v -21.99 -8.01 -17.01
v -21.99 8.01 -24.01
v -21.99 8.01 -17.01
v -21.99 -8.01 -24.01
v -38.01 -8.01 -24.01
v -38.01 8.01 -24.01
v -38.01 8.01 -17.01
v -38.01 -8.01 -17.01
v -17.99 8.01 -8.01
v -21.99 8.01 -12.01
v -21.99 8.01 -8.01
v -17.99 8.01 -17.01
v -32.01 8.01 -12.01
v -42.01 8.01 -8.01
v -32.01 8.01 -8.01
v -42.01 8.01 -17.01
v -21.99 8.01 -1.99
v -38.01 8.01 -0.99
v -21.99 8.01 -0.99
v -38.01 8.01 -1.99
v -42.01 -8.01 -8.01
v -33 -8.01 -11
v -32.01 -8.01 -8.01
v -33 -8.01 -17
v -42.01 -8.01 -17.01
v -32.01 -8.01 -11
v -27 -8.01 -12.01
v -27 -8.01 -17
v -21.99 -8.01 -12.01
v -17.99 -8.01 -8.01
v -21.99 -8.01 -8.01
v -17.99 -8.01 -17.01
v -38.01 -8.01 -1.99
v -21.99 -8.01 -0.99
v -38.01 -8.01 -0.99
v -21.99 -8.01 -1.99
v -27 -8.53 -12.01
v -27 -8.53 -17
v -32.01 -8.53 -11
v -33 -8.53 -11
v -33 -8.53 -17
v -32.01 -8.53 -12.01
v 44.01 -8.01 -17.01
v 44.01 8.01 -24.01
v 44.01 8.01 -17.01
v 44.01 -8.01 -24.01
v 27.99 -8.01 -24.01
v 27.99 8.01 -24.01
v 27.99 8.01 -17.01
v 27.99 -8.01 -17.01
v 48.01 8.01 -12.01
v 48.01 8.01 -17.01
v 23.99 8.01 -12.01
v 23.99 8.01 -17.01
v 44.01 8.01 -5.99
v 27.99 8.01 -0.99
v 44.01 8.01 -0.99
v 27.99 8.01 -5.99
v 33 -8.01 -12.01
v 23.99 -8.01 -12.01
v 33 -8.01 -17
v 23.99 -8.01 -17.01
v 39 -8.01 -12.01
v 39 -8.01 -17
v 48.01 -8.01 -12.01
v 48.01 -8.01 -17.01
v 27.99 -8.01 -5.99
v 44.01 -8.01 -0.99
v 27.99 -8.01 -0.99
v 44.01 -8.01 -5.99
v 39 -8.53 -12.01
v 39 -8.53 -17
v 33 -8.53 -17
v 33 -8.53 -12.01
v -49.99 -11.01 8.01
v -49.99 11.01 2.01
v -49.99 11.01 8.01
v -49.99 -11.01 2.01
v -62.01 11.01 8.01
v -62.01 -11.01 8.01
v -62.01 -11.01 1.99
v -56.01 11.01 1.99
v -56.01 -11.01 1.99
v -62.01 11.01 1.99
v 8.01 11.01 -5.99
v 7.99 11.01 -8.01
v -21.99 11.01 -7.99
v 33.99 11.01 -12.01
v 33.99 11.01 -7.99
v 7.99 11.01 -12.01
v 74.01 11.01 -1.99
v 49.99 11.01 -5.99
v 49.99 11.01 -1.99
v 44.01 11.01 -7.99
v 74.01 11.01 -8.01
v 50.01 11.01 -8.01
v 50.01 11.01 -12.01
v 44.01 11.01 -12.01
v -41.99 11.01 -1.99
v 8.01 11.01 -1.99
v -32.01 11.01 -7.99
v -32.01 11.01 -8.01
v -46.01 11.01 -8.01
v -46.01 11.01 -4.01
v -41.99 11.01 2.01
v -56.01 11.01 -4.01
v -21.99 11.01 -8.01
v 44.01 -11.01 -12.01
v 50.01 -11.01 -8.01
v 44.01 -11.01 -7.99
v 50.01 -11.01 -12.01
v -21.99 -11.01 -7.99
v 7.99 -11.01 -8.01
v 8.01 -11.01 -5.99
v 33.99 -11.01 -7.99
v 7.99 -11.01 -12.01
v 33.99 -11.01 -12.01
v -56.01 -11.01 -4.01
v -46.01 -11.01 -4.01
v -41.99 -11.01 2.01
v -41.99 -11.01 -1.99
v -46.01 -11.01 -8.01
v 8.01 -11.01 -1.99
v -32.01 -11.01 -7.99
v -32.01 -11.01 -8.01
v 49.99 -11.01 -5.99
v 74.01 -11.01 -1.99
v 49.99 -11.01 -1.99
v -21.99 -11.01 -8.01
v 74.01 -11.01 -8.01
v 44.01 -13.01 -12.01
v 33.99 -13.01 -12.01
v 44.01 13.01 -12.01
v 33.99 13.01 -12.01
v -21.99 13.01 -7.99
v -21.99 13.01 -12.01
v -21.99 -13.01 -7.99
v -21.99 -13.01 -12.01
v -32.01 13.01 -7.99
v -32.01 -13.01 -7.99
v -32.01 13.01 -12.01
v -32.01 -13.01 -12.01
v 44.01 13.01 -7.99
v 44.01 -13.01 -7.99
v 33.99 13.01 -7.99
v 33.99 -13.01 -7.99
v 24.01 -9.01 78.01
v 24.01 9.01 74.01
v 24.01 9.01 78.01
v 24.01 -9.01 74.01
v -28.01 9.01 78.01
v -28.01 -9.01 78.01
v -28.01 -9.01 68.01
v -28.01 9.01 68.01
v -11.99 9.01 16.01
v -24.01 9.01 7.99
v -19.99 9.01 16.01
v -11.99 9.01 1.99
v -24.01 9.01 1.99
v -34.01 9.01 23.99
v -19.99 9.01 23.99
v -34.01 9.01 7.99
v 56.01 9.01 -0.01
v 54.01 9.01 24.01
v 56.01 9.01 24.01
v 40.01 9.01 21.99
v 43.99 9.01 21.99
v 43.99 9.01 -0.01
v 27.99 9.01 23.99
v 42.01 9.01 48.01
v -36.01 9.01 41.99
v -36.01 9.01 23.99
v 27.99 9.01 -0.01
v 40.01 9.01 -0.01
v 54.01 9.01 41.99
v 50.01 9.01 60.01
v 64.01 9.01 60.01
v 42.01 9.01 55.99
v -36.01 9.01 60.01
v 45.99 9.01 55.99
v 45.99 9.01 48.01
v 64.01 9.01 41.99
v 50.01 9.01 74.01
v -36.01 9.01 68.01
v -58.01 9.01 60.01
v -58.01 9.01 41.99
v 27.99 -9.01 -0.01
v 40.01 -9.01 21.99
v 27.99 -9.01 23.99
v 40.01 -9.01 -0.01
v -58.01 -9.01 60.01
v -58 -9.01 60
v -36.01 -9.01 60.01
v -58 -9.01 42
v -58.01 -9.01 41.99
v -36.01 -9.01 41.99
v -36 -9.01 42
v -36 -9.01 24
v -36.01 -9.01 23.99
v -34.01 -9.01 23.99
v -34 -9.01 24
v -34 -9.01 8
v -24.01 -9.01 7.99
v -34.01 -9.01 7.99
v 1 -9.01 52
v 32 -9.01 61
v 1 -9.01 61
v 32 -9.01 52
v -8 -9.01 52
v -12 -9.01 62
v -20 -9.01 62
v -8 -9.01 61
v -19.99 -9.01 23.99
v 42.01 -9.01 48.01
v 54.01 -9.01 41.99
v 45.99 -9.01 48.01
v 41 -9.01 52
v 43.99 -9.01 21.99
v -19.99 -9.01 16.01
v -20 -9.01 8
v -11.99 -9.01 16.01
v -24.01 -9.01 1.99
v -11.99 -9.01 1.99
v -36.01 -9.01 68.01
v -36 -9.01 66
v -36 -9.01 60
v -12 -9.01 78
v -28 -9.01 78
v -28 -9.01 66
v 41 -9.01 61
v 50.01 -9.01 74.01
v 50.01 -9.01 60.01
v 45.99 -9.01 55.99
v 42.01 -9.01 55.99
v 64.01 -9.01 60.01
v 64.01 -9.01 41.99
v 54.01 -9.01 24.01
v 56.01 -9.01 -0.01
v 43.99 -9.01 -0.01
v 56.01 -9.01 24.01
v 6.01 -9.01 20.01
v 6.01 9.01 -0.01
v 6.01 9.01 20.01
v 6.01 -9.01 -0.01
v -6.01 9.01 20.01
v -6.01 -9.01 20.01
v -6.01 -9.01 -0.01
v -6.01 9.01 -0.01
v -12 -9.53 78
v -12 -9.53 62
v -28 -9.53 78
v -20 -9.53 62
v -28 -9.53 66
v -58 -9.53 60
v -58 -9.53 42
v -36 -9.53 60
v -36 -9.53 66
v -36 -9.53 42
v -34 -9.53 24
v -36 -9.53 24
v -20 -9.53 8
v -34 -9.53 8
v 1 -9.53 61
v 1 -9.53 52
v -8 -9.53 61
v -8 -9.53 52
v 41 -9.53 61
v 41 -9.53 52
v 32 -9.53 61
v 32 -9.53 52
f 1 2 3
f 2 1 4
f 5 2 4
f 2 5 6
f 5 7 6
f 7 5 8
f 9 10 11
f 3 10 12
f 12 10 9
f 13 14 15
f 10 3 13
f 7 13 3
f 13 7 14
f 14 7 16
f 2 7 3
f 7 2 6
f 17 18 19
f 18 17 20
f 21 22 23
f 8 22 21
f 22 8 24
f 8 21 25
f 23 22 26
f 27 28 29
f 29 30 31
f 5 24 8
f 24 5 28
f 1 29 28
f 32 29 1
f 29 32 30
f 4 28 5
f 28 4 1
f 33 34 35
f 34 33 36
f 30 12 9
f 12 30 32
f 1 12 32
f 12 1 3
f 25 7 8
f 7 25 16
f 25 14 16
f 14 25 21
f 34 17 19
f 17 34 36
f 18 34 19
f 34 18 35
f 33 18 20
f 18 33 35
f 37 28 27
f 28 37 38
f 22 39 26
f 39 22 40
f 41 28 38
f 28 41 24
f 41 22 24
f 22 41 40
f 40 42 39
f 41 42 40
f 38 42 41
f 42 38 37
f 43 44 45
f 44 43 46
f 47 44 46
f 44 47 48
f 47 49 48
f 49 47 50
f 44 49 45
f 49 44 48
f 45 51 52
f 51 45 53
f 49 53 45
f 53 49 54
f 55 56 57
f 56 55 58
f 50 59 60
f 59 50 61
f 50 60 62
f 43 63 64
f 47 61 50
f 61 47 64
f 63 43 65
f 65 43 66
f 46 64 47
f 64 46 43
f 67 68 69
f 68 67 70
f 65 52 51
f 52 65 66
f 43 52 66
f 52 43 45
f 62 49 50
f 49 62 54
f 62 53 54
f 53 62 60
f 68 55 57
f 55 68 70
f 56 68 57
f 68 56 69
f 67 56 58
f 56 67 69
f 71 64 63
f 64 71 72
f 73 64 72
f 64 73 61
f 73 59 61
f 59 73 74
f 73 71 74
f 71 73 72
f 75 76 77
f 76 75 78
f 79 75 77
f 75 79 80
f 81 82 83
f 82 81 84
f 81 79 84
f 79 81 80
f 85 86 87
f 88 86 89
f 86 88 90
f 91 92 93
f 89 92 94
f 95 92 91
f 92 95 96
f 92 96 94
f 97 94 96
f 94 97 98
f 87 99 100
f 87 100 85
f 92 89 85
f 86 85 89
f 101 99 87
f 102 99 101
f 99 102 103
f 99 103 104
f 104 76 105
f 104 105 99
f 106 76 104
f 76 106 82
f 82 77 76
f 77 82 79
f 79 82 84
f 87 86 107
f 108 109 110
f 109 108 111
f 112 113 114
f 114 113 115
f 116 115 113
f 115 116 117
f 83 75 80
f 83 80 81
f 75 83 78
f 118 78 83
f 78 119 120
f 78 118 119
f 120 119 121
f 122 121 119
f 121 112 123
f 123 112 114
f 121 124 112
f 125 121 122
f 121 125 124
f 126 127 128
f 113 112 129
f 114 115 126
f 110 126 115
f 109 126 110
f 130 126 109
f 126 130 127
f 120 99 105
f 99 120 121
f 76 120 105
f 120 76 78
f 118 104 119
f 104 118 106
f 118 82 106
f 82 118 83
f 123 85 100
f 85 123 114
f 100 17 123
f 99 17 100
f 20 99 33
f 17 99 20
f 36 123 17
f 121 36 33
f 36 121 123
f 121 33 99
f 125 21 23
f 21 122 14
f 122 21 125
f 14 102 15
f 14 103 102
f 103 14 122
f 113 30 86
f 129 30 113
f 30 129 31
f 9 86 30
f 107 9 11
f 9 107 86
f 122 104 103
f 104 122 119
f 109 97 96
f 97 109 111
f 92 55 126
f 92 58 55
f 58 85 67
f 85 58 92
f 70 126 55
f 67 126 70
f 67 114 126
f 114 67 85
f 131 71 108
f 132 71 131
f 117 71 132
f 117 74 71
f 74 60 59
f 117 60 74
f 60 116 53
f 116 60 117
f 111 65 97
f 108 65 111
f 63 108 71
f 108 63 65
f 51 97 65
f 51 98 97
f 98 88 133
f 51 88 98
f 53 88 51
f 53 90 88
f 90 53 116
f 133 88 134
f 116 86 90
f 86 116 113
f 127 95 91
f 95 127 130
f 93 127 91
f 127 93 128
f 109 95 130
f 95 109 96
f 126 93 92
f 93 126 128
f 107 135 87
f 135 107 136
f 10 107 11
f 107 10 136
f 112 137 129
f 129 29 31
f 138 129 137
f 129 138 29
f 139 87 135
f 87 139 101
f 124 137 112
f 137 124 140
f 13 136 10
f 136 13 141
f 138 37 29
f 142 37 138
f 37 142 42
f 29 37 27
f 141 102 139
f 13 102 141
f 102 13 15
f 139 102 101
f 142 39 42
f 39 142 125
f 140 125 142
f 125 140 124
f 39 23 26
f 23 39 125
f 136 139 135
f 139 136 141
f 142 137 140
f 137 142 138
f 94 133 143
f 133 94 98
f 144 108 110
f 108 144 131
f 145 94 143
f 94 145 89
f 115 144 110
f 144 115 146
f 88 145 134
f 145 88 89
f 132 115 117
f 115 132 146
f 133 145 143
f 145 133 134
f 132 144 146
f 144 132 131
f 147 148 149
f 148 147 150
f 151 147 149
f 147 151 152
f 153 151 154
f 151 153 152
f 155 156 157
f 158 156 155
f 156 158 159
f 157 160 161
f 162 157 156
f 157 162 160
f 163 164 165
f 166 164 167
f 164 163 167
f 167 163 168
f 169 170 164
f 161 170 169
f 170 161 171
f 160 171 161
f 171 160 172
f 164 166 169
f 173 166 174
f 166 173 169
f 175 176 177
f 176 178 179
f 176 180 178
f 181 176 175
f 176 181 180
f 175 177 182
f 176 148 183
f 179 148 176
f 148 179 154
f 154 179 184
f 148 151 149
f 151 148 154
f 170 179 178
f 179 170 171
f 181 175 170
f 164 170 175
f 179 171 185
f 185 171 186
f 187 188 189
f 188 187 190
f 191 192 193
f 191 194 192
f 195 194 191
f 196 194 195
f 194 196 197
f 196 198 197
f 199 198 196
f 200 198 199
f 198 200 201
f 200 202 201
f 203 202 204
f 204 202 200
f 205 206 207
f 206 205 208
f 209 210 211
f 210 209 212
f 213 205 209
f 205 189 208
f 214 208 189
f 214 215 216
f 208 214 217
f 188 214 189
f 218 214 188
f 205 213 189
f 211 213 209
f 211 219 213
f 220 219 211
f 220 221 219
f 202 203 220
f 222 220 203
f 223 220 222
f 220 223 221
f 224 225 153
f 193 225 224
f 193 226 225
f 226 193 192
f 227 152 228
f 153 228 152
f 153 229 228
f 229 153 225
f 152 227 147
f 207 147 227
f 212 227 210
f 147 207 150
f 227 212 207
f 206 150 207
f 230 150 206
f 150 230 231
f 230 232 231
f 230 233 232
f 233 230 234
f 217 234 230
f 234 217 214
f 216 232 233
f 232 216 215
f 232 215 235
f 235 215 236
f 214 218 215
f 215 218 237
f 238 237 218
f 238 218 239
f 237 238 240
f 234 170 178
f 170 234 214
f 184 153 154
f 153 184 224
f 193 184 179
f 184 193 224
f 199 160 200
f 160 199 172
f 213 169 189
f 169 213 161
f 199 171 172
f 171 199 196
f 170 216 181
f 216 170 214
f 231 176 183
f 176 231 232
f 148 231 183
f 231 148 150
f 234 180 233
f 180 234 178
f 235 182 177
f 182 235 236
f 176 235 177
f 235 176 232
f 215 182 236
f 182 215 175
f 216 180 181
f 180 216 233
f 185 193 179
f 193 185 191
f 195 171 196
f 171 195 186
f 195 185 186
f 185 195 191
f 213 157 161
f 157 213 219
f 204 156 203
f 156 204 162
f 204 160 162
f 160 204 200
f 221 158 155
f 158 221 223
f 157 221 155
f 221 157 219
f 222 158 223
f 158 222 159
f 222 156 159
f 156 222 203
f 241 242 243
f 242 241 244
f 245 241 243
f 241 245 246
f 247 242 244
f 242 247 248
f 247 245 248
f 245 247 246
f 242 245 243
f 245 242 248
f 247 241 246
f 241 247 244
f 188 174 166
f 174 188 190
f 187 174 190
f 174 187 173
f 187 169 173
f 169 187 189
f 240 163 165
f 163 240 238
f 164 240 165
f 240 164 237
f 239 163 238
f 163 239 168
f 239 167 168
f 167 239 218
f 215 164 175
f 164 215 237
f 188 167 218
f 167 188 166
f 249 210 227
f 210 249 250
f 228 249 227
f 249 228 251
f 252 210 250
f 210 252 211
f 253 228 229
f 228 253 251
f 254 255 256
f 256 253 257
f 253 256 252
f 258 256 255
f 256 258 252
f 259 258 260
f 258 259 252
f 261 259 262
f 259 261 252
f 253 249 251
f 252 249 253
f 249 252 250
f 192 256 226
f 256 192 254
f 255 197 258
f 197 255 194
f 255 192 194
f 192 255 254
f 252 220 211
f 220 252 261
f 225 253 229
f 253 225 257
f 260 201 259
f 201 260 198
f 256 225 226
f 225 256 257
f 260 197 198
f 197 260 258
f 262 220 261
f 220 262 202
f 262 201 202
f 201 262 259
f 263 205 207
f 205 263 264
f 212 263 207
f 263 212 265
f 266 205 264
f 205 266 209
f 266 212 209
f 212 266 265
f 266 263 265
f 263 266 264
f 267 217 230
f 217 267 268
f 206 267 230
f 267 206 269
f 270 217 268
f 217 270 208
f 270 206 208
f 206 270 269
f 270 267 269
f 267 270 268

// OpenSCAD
// Skateboard Charm - Version 004
// Reference: references/17_clawd_skateboard.png
// Changes from previous version:
// - Removed the white sticker/backing layer from the physical model.
// - Rebuilt Clawd as a true 3D block figure assembled from rectangular prisms.
// - Kept the skateboard as a pixel-style maroon deck with blocky yellow wheels.

eps = 0.02;
$fn = 32;

body_d = 18;
deck_d = 22;
wheel_d = 16;
face_d = 0.55;

orange = [0.96, 0.45, 0.29];
shadow_orange = [0.75, 0.36, 0.28];
black = [0.02, 0.02, 0.02];
maroon = [0.34, 0.07, 0.16];
wheel_yellow = [1.00, 0.68, 0.28];
axle_gray = [0.35, 0.34, 0.34];

module block(x, z, w, h, d, material, y = 0) {
    color(material)
        translate([x + w / 2, y, z + h / 2])
            cube([w + eps, d + eps, h + eps], center = true);
}

module face_block(x, z, w, h, material, host_d = body_d) {
    color(material)
        translate([x + w / 2, -host_d / 2 - face_d / 2 + eps, z + h / 2])
            cube([w, face_d, h], center = true);
}

module clawd_body() {
    // Primary orange mass. The front silhouette follows the reference art, but
    // each area is a separate cuboid so the model reads as a 3D block figure.
    block(-28, 62, 52, 16, body_d, orange);       // top head step
    block(-36, 44, 78, 24, body_d, orange);       // main face/body
    block(-36, 24, 54, 22, body_d, orange);       // lower left body
    block(18, 24, 30, 24, body_d, orange);        // lower right body
    block(24, 56, 26, 18, body_d, orange);        // upper right step
    block(46, 42, 18, 18, body_d, orange);        // right cheek protrusion
    block(-58, 42, 24, 18, body_d, orange);       // left cheek protrusion

    // Blocky legs and dangling lower pixels.
    block(-34, 8, 14, 26, body_d, orange);
    block(-24, 2, 12, 14, body_d, orange);
    block(-6, 0, 12, 20, body_d, orange);
    block(28, 0, 12, 24, body_d, orange);
    block(44, 0, 12, 24, body_d, orange);
    block(40, 22, 14, 20, body_d, orange);

    // Darker orange blocks capture the left-side pixel shading from the image.
    face_block(-28, 62, 16, 16, shadow_orange);
    face_block(-58, 42, 24, 18, shadow_orange);
    face_block(-36, 24, 16, 42, shadow_orange);
    face_block(-34, 8, 14, 26, shadow_orange);

    // Raised square eyes on the front face.
    face_block(-8, 52, 9, 9, black);
    face_block(32, 52, 9, 9, black);
}

module deck_block(x, z, w, h) {
    block(x, z, w, h, deck_d, maroon, 0);
}

module pixel_wheel(cx) {
    // Pixel wheels are square/cuboid clusters rather than cylinders.
    block(cx - 8, -24, 16, 7, wheel_d, wheel_yellow, 0);
    block(cx - 12, -17, 24, 9, wheel_d, wheel_yellow, 0);
    block(cx - 8, -8, 16, 7, wheel_d, wheel_yellow, 0);
    face_block(cx - 3, -17, 6, 6, maroon, wheel_d);
}

module pixel_skateboard() {
    // Side-view pixel skateboard. The right tail extends farther like the
    // reference, while the left nose steps upward.
    deck_block(-62, 2, 12, 6);
    deck_block(-56, -4, 14, 6);
    deck_block(-46, -8, 54, 6);
    deck_block(8, -12, 42, 6);
    deck_block(50, -8, 24, 6);

    // Simple block trucks tucked under the deck for print strength.
    block(-32, -12, 10, 4, deck_d + 4, axle_gray, 0);
    block(34, -12, 10, 4, deck_d + 4, axle_gray, 0);

    pixel_wheel(-30);
    pixel_wheel(36);
}

module model() {
    union() {
        pixel_skateboard();
        clawd_body();
    }
}

model();
